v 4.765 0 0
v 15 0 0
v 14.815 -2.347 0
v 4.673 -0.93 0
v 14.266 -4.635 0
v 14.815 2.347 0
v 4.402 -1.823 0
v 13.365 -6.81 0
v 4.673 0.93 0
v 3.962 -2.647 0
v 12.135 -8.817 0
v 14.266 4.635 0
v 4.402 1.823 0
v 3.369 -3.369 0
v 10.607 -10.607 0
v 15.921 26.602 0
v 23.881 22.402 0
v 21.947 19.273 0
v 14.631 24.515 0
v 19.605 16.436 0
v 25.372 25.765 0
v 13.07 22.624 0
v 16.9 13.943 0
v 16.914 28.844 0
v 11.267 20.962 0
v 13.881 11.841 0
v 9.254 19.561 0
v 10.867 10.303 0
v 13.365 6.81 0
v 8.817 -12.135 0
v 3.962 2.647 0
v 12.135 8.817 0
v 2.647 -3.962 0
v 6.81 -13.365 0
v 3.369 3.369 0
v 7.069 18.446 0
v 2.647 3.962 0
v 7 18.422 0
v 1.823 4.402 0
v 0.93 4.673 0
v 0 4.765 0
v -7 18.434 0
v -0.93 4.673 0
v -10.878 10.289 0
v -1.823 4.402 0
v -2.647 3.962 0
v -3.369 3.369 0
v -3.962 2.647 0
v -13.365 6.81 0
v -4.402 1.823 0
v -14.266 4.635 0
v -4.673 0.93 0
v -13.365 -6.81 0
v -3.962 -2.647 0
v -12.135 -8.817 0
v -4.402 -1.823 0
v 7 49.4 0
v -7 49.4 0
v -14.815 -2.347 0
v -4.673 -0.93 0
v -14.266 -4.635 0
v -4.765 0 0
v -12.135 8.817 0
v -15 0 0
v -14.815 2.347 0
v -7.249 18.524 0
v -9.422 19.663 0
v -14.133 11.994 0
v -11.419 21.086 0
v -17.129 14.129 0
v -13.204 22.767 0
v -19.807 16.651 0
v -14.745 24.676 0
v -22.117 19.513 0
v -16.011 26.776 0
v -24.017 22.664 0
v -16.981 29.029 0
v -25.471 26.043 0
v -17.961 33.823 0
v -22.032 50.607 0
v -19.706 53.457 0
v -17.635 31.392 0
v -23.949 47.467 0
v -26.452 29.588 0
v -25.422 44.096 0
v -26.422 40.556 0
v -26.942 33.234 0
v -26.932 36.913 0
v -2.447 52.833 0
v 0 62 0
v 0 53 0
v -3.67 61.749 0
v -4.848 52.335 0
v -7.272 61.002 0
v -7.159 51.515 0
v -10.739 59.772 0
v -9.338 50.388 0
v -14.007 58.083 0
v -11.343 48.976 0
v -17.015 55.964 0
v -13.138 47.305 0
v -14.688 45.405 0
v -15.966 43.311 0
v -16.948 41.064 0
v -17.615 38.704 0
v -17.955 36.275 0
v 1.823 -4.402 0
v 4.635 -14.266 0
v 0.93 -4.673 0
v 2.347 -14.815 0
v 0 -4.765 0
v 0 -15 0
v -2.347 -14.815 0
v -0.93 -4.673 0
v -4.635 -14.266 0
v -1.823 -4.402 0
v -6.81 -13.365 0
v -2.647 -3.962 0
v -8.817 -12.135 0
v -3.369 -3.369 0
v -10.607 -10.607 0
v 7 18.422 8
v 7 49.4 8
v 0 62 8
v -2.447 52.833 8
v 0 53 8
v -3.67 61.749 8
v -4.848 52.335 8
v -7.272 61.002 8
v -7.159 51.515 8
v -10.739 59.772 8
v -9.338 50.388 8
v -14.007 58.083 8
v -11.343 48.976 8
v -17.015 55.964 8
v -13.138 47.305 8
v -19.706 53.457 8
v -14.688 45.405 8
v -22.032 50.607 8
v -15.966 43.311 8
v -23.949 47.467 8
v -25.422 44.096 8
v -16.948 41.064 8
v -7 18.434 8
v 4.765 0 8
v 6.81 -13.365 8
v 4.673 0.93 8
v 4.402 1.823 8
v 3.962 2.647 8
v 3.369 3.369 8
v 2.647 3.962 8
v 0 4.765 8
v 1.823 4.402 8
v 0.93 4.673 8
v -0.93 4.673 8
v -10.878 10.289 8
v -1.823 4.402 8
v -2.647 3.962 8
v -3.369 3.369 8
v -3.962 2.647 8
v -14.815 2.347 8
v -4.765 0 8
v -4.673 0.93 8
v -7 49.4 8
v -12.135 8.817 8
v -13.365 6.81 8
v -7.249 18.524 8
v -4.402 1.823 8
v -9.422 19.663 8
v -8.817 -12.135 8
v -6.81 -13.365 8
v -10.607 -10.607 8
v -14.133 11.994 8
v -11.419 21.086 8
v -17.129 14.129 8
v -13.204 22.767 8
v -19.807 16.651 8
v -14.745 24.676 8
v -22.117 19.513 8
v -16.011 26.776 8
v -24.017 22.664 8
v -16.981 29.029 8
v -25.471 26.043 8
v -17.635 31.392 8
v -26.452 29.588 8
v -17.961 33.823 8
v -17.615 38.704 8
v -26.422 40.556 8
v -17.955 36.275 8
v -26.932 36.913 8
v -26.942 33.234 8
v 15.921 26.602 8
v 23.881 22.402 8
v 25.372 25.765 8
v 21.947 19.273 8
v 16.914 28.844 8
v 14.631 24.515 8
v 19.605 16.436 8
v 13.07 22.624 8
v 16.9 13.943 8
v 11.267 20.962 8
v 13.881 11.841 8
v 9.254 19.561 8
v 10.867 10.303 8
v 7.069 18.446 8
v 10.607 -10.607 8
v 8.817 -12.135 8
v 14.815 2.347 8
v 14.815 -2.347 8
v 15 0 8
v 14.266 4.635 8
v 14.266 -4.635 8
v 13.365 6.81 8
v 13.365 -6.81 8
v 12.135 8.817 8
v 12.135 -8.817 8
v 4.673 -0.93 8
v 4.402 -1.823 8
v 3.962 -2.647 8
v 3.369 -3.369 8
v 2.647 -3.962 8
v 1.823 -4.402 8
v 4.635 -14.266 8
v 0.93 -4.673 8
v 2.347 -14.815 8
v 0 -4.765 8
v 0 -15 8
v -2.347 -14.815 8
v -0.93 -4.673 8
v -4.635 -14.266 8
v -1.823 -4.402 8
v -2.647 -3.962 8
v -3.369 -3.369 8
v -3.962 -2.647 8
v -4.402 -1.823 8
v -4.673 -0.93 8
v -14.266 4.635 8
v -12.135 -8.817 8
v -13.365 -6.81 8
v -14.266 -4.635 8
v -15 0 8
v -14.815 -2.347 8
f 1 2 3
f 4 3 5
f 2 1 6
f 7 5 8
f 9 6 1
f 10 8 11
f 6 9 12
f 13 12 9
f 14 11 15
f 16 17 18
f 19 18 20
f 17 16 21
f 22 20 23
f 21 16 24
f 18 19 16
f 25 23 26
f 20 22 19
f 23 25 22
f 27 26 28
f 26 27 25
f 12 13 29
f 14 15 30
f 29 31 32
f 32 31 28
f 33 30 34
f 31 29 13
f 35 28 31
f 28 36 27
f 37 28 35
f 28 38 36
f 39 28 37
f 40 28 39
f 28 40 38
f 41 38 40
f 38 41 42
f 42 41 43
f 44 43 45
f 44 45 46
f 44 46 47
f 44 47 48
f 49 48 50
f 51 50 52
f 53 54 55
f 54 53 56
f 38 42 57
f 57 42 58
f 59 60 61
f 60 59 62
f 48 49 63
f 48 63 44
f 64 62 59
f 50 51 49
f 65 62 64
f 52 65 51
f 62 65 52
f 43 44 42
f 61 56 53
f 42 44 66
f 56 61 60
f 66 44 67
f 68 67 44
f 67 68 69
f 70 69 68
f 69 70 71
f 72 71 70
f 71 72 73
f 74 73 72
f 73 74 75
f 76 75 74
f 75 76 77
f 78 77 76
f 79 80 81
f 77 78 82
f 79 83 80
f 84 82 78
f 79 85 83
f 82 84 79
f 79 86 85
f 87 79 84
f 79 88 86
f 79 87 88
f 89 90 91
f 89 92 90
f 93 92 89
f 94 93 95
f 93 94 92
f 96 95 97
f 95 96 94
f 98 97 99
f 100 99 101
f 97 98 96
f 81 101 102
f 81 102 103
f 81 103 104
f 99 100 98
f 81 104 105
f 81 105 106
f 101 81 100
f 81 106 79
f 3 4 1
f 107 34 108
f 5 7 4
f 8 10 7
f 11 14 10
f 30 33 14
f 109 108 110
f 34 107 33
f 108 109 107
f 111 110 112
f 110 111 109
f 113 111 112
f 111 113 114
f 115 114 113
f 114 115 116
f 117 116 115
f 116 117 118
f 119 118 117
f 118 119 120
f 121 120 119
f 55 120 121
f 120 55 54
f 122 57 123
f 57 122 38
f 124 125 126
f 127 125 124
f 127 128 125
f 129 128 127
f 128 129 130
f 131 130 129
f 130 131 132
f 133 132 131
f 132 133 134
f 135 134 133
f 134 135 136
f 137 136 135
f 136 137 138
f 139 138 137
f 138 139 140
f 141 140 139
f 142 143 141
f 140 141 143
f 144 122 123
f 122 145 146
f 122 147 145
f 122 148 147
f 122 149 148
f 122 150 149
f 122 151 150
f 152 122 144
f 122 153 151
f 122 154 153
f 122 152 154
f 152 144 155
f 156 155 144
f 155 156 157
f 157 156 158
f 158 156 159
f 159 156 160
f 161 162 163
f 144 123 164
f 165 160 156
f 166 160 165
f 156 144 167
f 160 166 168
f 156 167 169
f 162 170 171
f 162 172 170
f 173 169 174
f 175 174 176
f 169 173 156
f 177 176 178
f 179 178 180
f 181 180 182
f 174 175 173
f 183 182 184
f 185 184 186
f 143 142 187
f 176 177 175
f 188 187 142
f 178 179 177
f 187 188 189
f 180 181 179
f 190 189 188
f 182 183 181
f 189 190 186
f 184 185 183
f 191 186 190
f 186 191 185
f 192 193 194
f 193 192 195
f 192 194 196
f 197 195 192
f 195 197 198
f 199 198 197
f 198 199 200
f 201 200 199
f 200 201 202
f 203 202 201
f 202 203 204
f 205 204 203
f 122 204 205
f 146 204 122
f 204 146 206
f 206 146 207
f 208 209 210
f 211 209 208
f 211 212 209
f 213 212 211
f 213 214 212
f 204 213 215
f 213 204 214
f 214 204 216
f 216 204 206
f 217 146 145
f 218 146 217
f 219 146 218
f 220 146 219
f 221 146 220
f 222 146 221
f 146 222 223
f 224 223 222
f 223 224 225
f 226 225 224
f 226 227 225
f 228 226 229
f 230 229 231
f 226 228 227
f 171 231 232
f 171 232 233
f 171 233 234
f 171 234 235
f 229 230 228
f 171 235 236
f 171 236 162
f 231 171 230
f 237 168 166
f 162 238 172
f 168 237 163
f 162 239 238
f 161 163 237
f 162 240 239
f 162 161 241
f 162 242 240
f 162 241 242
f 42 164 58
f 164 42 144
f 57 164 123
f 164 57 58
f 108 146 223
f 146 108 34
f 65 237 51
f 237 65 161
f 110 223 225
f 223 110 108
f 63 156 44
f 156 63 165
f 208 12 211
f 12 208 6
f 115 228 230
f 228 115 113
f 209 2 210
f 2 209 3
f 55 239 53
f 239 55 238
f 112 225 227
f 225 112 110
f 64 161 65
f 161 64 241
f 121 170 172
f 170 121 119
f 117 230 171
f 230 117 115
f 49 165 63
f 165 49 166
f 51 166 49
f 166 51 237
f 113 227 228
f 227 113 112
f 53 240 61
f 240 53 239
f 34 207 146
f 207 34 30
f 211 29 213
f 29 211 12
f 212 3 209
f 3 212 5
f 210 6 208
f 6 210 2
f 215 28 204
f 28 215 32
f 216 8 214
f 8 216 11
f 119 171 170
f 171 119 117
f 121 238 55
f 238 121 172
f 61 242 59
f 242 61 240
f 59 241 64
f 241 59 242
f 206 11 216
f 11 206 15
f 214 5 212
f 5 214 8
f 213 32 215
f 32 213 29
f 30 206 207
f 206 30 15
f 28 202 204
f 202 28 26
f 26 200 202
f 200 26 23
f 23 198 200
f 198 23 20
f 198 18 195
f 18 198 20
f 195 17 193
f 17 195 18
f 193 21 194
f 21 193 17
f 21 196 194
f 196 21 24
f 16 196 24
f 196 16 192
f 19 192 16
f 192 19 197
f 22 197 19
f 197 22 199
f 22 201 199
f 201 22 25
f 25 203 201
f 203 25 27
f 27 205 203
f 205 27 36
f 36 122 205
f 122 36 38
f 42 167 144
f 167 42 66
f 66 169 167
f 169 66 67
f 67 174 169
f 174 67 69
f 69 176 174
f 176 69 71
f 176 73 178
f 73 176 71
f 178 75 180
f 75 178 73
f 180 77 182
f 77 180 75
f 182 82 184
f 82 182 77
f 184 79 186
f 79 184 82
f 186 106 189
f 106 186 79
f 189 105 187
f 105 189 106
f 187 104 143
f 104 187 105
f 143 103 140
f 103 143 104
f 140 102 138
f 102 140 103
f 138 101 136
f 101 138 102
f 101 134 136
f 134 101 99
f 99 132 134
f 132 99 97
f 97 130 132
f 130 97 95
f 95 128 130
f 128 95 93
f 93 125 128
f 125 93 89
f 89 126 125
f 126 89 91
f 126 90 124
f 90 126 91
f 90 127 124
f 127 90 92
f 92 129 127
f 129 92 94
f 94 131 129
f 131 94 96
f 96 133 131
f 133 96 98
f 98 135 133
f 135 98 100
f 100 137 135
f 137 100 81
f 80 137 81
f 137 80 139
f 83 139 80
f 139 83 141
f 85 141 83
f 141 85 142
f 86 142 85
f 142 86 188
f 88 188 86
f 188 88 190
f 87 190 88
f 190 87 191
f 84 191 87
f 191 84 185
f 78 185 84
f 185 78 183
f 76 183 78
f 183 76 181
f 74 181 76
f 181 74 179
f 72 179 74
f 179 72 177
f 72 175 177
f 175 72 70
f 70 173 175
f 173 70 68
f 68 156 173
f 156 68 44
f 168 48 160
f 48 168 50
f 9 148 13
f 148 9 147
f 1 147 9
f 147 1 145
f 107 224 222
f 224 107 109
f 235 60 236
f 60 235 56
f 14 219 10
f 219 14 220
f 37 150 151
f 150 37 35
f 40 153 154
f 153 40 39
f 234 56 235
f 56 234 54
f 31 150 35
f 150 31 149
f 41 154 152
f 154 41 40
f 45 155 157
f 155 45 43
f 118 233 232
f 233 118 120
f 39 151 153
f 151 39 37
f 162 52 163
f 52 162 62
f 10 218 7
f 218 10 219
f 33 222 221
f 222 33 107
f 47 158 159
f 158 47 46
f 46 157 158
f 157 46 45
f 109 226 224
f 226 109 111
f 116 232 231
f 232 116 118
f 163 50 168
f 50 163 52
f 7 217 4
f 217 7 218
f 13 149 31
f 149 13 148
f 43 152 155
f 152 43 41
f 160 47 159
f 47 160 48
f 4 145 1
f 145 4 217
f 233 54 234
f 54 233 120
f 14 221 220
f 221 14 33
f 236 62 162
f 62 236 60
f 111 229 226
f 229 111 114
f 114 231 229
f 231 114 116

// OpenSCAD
$fn = 32;

// ----------------------------------------------------------------------
// Hook: 70 mm shank into a 18 mm curl, 8 mm thick
// ----------------------------------------------------------------------

// --- parameters (mm) ---
shank_len = 70;           // shank length from the boss centre
shank_w = 14;             // shank width
boss_d = 30;              // boss diameter
bore_d = 9.53;            // boss bore
curl_in = 18;             // curl inner radius
curl_out = 27;            // curl outer radius
curl_sweep = 250;         // curl sweep angle
hook_t = 8;               // hook thickness

shank_profile = [[-7, 49.4], [7, 49.4], [7, 13], [-7, 13]];
boss_profile = [[15, 0], [14.815, 2.347], [14.266, 4.635], [13.365, 6.81], [12.135, 8.817], [10.607, 10.607], [8.817, 12.135], [6.81, 13.365], [4.635, 14.266], [2.347, 14.815], [0, 15], [-2.347, 14.815], [-4.635, 14.266], [-6.81, 13.365], [-8.817, 12.135], [-10.607, 10.607], [-12.135, 8.817], [-13.365, 6.81], [-14.266, 4.635], [-14.815, 2.347], [-15, 0], [-14.815, -2.347], [-14.266, -4.635], [-13.365, -6.81], [-12.135, -8.817], [-10.607, -10.607], [-8.817, -12.135], [-6.81, -13.365], [-4.635, -14.266], [-2.347, -14.815], [0, -15], [2.347, -14.815], [4.635, -14.266], [6.81, -13.365], [8.817, -12.135], [10.607, -10.607], [12.135, -8.817], [13.365, -6.81], [14.266, -4.635], [14.815, -2.347]];
curl_profile = [[0, 62], [-3.67, 61.749], [-7.272, 61.002], [-10.739, 59.772], [-14.007, 58.083], [-17.015, 55.964], [-19.706, 53.457], [-22.032, 50.607], [-23.949, 47.467], [-25.422, 44.096], [-26.422, 40.556], [-26.932, 36.913], [-26.942, 33.234], [-26.452, 29.588], [-25.471, 26.043], [-24.017, 22.664], [-22.117, 19.513], [-19.807, 16.651], [-17.129, 14.129], [-14.133, 11.994], [-10.874, 10.287], [-7.414, 9.038], [-3.816, 8.271], [-0.147, 8], [3.524, 8.231], [7.13, 8.959], [10.604, 10.169], [13.881, 11.841], [16.9, 13.943], [19.605, 16.436], [21.947, 19.273], [23.881, 22.402], [25.372, 25.765], [16.914, 28.844], [15.921, 26.602], [14.631, 24.515], [13.07, 22.624], [11.267, 20.962], [9.254, 19.561], [7.069, 18.446], [4.754, 17.639], [2.349, 17.154], [-0.098, 17], [-2.544, 17.181], [-4.943, 17.692], [-7.249, 18.524], [-9.422, 19.663], [-11.419, 21.086], [-13.204, 22.767], [-14.745, 24.676], [-16.011, 26.776], [-16.981, 29.029], [-17.635, 31.392], [-17.961, 33.823], [-17.955, 36.275], [-17.615, 38.704], [-16.948, 41.064], [-15.966, 43.311], [-14.688, 45.405], [-13.138, 47.305], [-11.343, 48.976], [-9.338, 50.388], [-7.159, 51.515], [-4.848, 52.335], [-2.447, 52.833], [0, 53]];

difference() {
  union() {
    /* three overlapping outlines: shank, boss and the smooth curl */
    linear_extrude(height = hook_t) polygon(shank_profile);
    linear_extrude(height = hook_t) polygon(boss_profile);
    linear_extrude(height = hook_t) polygon(curl_profile);
  }
  translate([0, 0, -2.5]) cylinder(h = hook_t + 5, d = bore_d);
}
